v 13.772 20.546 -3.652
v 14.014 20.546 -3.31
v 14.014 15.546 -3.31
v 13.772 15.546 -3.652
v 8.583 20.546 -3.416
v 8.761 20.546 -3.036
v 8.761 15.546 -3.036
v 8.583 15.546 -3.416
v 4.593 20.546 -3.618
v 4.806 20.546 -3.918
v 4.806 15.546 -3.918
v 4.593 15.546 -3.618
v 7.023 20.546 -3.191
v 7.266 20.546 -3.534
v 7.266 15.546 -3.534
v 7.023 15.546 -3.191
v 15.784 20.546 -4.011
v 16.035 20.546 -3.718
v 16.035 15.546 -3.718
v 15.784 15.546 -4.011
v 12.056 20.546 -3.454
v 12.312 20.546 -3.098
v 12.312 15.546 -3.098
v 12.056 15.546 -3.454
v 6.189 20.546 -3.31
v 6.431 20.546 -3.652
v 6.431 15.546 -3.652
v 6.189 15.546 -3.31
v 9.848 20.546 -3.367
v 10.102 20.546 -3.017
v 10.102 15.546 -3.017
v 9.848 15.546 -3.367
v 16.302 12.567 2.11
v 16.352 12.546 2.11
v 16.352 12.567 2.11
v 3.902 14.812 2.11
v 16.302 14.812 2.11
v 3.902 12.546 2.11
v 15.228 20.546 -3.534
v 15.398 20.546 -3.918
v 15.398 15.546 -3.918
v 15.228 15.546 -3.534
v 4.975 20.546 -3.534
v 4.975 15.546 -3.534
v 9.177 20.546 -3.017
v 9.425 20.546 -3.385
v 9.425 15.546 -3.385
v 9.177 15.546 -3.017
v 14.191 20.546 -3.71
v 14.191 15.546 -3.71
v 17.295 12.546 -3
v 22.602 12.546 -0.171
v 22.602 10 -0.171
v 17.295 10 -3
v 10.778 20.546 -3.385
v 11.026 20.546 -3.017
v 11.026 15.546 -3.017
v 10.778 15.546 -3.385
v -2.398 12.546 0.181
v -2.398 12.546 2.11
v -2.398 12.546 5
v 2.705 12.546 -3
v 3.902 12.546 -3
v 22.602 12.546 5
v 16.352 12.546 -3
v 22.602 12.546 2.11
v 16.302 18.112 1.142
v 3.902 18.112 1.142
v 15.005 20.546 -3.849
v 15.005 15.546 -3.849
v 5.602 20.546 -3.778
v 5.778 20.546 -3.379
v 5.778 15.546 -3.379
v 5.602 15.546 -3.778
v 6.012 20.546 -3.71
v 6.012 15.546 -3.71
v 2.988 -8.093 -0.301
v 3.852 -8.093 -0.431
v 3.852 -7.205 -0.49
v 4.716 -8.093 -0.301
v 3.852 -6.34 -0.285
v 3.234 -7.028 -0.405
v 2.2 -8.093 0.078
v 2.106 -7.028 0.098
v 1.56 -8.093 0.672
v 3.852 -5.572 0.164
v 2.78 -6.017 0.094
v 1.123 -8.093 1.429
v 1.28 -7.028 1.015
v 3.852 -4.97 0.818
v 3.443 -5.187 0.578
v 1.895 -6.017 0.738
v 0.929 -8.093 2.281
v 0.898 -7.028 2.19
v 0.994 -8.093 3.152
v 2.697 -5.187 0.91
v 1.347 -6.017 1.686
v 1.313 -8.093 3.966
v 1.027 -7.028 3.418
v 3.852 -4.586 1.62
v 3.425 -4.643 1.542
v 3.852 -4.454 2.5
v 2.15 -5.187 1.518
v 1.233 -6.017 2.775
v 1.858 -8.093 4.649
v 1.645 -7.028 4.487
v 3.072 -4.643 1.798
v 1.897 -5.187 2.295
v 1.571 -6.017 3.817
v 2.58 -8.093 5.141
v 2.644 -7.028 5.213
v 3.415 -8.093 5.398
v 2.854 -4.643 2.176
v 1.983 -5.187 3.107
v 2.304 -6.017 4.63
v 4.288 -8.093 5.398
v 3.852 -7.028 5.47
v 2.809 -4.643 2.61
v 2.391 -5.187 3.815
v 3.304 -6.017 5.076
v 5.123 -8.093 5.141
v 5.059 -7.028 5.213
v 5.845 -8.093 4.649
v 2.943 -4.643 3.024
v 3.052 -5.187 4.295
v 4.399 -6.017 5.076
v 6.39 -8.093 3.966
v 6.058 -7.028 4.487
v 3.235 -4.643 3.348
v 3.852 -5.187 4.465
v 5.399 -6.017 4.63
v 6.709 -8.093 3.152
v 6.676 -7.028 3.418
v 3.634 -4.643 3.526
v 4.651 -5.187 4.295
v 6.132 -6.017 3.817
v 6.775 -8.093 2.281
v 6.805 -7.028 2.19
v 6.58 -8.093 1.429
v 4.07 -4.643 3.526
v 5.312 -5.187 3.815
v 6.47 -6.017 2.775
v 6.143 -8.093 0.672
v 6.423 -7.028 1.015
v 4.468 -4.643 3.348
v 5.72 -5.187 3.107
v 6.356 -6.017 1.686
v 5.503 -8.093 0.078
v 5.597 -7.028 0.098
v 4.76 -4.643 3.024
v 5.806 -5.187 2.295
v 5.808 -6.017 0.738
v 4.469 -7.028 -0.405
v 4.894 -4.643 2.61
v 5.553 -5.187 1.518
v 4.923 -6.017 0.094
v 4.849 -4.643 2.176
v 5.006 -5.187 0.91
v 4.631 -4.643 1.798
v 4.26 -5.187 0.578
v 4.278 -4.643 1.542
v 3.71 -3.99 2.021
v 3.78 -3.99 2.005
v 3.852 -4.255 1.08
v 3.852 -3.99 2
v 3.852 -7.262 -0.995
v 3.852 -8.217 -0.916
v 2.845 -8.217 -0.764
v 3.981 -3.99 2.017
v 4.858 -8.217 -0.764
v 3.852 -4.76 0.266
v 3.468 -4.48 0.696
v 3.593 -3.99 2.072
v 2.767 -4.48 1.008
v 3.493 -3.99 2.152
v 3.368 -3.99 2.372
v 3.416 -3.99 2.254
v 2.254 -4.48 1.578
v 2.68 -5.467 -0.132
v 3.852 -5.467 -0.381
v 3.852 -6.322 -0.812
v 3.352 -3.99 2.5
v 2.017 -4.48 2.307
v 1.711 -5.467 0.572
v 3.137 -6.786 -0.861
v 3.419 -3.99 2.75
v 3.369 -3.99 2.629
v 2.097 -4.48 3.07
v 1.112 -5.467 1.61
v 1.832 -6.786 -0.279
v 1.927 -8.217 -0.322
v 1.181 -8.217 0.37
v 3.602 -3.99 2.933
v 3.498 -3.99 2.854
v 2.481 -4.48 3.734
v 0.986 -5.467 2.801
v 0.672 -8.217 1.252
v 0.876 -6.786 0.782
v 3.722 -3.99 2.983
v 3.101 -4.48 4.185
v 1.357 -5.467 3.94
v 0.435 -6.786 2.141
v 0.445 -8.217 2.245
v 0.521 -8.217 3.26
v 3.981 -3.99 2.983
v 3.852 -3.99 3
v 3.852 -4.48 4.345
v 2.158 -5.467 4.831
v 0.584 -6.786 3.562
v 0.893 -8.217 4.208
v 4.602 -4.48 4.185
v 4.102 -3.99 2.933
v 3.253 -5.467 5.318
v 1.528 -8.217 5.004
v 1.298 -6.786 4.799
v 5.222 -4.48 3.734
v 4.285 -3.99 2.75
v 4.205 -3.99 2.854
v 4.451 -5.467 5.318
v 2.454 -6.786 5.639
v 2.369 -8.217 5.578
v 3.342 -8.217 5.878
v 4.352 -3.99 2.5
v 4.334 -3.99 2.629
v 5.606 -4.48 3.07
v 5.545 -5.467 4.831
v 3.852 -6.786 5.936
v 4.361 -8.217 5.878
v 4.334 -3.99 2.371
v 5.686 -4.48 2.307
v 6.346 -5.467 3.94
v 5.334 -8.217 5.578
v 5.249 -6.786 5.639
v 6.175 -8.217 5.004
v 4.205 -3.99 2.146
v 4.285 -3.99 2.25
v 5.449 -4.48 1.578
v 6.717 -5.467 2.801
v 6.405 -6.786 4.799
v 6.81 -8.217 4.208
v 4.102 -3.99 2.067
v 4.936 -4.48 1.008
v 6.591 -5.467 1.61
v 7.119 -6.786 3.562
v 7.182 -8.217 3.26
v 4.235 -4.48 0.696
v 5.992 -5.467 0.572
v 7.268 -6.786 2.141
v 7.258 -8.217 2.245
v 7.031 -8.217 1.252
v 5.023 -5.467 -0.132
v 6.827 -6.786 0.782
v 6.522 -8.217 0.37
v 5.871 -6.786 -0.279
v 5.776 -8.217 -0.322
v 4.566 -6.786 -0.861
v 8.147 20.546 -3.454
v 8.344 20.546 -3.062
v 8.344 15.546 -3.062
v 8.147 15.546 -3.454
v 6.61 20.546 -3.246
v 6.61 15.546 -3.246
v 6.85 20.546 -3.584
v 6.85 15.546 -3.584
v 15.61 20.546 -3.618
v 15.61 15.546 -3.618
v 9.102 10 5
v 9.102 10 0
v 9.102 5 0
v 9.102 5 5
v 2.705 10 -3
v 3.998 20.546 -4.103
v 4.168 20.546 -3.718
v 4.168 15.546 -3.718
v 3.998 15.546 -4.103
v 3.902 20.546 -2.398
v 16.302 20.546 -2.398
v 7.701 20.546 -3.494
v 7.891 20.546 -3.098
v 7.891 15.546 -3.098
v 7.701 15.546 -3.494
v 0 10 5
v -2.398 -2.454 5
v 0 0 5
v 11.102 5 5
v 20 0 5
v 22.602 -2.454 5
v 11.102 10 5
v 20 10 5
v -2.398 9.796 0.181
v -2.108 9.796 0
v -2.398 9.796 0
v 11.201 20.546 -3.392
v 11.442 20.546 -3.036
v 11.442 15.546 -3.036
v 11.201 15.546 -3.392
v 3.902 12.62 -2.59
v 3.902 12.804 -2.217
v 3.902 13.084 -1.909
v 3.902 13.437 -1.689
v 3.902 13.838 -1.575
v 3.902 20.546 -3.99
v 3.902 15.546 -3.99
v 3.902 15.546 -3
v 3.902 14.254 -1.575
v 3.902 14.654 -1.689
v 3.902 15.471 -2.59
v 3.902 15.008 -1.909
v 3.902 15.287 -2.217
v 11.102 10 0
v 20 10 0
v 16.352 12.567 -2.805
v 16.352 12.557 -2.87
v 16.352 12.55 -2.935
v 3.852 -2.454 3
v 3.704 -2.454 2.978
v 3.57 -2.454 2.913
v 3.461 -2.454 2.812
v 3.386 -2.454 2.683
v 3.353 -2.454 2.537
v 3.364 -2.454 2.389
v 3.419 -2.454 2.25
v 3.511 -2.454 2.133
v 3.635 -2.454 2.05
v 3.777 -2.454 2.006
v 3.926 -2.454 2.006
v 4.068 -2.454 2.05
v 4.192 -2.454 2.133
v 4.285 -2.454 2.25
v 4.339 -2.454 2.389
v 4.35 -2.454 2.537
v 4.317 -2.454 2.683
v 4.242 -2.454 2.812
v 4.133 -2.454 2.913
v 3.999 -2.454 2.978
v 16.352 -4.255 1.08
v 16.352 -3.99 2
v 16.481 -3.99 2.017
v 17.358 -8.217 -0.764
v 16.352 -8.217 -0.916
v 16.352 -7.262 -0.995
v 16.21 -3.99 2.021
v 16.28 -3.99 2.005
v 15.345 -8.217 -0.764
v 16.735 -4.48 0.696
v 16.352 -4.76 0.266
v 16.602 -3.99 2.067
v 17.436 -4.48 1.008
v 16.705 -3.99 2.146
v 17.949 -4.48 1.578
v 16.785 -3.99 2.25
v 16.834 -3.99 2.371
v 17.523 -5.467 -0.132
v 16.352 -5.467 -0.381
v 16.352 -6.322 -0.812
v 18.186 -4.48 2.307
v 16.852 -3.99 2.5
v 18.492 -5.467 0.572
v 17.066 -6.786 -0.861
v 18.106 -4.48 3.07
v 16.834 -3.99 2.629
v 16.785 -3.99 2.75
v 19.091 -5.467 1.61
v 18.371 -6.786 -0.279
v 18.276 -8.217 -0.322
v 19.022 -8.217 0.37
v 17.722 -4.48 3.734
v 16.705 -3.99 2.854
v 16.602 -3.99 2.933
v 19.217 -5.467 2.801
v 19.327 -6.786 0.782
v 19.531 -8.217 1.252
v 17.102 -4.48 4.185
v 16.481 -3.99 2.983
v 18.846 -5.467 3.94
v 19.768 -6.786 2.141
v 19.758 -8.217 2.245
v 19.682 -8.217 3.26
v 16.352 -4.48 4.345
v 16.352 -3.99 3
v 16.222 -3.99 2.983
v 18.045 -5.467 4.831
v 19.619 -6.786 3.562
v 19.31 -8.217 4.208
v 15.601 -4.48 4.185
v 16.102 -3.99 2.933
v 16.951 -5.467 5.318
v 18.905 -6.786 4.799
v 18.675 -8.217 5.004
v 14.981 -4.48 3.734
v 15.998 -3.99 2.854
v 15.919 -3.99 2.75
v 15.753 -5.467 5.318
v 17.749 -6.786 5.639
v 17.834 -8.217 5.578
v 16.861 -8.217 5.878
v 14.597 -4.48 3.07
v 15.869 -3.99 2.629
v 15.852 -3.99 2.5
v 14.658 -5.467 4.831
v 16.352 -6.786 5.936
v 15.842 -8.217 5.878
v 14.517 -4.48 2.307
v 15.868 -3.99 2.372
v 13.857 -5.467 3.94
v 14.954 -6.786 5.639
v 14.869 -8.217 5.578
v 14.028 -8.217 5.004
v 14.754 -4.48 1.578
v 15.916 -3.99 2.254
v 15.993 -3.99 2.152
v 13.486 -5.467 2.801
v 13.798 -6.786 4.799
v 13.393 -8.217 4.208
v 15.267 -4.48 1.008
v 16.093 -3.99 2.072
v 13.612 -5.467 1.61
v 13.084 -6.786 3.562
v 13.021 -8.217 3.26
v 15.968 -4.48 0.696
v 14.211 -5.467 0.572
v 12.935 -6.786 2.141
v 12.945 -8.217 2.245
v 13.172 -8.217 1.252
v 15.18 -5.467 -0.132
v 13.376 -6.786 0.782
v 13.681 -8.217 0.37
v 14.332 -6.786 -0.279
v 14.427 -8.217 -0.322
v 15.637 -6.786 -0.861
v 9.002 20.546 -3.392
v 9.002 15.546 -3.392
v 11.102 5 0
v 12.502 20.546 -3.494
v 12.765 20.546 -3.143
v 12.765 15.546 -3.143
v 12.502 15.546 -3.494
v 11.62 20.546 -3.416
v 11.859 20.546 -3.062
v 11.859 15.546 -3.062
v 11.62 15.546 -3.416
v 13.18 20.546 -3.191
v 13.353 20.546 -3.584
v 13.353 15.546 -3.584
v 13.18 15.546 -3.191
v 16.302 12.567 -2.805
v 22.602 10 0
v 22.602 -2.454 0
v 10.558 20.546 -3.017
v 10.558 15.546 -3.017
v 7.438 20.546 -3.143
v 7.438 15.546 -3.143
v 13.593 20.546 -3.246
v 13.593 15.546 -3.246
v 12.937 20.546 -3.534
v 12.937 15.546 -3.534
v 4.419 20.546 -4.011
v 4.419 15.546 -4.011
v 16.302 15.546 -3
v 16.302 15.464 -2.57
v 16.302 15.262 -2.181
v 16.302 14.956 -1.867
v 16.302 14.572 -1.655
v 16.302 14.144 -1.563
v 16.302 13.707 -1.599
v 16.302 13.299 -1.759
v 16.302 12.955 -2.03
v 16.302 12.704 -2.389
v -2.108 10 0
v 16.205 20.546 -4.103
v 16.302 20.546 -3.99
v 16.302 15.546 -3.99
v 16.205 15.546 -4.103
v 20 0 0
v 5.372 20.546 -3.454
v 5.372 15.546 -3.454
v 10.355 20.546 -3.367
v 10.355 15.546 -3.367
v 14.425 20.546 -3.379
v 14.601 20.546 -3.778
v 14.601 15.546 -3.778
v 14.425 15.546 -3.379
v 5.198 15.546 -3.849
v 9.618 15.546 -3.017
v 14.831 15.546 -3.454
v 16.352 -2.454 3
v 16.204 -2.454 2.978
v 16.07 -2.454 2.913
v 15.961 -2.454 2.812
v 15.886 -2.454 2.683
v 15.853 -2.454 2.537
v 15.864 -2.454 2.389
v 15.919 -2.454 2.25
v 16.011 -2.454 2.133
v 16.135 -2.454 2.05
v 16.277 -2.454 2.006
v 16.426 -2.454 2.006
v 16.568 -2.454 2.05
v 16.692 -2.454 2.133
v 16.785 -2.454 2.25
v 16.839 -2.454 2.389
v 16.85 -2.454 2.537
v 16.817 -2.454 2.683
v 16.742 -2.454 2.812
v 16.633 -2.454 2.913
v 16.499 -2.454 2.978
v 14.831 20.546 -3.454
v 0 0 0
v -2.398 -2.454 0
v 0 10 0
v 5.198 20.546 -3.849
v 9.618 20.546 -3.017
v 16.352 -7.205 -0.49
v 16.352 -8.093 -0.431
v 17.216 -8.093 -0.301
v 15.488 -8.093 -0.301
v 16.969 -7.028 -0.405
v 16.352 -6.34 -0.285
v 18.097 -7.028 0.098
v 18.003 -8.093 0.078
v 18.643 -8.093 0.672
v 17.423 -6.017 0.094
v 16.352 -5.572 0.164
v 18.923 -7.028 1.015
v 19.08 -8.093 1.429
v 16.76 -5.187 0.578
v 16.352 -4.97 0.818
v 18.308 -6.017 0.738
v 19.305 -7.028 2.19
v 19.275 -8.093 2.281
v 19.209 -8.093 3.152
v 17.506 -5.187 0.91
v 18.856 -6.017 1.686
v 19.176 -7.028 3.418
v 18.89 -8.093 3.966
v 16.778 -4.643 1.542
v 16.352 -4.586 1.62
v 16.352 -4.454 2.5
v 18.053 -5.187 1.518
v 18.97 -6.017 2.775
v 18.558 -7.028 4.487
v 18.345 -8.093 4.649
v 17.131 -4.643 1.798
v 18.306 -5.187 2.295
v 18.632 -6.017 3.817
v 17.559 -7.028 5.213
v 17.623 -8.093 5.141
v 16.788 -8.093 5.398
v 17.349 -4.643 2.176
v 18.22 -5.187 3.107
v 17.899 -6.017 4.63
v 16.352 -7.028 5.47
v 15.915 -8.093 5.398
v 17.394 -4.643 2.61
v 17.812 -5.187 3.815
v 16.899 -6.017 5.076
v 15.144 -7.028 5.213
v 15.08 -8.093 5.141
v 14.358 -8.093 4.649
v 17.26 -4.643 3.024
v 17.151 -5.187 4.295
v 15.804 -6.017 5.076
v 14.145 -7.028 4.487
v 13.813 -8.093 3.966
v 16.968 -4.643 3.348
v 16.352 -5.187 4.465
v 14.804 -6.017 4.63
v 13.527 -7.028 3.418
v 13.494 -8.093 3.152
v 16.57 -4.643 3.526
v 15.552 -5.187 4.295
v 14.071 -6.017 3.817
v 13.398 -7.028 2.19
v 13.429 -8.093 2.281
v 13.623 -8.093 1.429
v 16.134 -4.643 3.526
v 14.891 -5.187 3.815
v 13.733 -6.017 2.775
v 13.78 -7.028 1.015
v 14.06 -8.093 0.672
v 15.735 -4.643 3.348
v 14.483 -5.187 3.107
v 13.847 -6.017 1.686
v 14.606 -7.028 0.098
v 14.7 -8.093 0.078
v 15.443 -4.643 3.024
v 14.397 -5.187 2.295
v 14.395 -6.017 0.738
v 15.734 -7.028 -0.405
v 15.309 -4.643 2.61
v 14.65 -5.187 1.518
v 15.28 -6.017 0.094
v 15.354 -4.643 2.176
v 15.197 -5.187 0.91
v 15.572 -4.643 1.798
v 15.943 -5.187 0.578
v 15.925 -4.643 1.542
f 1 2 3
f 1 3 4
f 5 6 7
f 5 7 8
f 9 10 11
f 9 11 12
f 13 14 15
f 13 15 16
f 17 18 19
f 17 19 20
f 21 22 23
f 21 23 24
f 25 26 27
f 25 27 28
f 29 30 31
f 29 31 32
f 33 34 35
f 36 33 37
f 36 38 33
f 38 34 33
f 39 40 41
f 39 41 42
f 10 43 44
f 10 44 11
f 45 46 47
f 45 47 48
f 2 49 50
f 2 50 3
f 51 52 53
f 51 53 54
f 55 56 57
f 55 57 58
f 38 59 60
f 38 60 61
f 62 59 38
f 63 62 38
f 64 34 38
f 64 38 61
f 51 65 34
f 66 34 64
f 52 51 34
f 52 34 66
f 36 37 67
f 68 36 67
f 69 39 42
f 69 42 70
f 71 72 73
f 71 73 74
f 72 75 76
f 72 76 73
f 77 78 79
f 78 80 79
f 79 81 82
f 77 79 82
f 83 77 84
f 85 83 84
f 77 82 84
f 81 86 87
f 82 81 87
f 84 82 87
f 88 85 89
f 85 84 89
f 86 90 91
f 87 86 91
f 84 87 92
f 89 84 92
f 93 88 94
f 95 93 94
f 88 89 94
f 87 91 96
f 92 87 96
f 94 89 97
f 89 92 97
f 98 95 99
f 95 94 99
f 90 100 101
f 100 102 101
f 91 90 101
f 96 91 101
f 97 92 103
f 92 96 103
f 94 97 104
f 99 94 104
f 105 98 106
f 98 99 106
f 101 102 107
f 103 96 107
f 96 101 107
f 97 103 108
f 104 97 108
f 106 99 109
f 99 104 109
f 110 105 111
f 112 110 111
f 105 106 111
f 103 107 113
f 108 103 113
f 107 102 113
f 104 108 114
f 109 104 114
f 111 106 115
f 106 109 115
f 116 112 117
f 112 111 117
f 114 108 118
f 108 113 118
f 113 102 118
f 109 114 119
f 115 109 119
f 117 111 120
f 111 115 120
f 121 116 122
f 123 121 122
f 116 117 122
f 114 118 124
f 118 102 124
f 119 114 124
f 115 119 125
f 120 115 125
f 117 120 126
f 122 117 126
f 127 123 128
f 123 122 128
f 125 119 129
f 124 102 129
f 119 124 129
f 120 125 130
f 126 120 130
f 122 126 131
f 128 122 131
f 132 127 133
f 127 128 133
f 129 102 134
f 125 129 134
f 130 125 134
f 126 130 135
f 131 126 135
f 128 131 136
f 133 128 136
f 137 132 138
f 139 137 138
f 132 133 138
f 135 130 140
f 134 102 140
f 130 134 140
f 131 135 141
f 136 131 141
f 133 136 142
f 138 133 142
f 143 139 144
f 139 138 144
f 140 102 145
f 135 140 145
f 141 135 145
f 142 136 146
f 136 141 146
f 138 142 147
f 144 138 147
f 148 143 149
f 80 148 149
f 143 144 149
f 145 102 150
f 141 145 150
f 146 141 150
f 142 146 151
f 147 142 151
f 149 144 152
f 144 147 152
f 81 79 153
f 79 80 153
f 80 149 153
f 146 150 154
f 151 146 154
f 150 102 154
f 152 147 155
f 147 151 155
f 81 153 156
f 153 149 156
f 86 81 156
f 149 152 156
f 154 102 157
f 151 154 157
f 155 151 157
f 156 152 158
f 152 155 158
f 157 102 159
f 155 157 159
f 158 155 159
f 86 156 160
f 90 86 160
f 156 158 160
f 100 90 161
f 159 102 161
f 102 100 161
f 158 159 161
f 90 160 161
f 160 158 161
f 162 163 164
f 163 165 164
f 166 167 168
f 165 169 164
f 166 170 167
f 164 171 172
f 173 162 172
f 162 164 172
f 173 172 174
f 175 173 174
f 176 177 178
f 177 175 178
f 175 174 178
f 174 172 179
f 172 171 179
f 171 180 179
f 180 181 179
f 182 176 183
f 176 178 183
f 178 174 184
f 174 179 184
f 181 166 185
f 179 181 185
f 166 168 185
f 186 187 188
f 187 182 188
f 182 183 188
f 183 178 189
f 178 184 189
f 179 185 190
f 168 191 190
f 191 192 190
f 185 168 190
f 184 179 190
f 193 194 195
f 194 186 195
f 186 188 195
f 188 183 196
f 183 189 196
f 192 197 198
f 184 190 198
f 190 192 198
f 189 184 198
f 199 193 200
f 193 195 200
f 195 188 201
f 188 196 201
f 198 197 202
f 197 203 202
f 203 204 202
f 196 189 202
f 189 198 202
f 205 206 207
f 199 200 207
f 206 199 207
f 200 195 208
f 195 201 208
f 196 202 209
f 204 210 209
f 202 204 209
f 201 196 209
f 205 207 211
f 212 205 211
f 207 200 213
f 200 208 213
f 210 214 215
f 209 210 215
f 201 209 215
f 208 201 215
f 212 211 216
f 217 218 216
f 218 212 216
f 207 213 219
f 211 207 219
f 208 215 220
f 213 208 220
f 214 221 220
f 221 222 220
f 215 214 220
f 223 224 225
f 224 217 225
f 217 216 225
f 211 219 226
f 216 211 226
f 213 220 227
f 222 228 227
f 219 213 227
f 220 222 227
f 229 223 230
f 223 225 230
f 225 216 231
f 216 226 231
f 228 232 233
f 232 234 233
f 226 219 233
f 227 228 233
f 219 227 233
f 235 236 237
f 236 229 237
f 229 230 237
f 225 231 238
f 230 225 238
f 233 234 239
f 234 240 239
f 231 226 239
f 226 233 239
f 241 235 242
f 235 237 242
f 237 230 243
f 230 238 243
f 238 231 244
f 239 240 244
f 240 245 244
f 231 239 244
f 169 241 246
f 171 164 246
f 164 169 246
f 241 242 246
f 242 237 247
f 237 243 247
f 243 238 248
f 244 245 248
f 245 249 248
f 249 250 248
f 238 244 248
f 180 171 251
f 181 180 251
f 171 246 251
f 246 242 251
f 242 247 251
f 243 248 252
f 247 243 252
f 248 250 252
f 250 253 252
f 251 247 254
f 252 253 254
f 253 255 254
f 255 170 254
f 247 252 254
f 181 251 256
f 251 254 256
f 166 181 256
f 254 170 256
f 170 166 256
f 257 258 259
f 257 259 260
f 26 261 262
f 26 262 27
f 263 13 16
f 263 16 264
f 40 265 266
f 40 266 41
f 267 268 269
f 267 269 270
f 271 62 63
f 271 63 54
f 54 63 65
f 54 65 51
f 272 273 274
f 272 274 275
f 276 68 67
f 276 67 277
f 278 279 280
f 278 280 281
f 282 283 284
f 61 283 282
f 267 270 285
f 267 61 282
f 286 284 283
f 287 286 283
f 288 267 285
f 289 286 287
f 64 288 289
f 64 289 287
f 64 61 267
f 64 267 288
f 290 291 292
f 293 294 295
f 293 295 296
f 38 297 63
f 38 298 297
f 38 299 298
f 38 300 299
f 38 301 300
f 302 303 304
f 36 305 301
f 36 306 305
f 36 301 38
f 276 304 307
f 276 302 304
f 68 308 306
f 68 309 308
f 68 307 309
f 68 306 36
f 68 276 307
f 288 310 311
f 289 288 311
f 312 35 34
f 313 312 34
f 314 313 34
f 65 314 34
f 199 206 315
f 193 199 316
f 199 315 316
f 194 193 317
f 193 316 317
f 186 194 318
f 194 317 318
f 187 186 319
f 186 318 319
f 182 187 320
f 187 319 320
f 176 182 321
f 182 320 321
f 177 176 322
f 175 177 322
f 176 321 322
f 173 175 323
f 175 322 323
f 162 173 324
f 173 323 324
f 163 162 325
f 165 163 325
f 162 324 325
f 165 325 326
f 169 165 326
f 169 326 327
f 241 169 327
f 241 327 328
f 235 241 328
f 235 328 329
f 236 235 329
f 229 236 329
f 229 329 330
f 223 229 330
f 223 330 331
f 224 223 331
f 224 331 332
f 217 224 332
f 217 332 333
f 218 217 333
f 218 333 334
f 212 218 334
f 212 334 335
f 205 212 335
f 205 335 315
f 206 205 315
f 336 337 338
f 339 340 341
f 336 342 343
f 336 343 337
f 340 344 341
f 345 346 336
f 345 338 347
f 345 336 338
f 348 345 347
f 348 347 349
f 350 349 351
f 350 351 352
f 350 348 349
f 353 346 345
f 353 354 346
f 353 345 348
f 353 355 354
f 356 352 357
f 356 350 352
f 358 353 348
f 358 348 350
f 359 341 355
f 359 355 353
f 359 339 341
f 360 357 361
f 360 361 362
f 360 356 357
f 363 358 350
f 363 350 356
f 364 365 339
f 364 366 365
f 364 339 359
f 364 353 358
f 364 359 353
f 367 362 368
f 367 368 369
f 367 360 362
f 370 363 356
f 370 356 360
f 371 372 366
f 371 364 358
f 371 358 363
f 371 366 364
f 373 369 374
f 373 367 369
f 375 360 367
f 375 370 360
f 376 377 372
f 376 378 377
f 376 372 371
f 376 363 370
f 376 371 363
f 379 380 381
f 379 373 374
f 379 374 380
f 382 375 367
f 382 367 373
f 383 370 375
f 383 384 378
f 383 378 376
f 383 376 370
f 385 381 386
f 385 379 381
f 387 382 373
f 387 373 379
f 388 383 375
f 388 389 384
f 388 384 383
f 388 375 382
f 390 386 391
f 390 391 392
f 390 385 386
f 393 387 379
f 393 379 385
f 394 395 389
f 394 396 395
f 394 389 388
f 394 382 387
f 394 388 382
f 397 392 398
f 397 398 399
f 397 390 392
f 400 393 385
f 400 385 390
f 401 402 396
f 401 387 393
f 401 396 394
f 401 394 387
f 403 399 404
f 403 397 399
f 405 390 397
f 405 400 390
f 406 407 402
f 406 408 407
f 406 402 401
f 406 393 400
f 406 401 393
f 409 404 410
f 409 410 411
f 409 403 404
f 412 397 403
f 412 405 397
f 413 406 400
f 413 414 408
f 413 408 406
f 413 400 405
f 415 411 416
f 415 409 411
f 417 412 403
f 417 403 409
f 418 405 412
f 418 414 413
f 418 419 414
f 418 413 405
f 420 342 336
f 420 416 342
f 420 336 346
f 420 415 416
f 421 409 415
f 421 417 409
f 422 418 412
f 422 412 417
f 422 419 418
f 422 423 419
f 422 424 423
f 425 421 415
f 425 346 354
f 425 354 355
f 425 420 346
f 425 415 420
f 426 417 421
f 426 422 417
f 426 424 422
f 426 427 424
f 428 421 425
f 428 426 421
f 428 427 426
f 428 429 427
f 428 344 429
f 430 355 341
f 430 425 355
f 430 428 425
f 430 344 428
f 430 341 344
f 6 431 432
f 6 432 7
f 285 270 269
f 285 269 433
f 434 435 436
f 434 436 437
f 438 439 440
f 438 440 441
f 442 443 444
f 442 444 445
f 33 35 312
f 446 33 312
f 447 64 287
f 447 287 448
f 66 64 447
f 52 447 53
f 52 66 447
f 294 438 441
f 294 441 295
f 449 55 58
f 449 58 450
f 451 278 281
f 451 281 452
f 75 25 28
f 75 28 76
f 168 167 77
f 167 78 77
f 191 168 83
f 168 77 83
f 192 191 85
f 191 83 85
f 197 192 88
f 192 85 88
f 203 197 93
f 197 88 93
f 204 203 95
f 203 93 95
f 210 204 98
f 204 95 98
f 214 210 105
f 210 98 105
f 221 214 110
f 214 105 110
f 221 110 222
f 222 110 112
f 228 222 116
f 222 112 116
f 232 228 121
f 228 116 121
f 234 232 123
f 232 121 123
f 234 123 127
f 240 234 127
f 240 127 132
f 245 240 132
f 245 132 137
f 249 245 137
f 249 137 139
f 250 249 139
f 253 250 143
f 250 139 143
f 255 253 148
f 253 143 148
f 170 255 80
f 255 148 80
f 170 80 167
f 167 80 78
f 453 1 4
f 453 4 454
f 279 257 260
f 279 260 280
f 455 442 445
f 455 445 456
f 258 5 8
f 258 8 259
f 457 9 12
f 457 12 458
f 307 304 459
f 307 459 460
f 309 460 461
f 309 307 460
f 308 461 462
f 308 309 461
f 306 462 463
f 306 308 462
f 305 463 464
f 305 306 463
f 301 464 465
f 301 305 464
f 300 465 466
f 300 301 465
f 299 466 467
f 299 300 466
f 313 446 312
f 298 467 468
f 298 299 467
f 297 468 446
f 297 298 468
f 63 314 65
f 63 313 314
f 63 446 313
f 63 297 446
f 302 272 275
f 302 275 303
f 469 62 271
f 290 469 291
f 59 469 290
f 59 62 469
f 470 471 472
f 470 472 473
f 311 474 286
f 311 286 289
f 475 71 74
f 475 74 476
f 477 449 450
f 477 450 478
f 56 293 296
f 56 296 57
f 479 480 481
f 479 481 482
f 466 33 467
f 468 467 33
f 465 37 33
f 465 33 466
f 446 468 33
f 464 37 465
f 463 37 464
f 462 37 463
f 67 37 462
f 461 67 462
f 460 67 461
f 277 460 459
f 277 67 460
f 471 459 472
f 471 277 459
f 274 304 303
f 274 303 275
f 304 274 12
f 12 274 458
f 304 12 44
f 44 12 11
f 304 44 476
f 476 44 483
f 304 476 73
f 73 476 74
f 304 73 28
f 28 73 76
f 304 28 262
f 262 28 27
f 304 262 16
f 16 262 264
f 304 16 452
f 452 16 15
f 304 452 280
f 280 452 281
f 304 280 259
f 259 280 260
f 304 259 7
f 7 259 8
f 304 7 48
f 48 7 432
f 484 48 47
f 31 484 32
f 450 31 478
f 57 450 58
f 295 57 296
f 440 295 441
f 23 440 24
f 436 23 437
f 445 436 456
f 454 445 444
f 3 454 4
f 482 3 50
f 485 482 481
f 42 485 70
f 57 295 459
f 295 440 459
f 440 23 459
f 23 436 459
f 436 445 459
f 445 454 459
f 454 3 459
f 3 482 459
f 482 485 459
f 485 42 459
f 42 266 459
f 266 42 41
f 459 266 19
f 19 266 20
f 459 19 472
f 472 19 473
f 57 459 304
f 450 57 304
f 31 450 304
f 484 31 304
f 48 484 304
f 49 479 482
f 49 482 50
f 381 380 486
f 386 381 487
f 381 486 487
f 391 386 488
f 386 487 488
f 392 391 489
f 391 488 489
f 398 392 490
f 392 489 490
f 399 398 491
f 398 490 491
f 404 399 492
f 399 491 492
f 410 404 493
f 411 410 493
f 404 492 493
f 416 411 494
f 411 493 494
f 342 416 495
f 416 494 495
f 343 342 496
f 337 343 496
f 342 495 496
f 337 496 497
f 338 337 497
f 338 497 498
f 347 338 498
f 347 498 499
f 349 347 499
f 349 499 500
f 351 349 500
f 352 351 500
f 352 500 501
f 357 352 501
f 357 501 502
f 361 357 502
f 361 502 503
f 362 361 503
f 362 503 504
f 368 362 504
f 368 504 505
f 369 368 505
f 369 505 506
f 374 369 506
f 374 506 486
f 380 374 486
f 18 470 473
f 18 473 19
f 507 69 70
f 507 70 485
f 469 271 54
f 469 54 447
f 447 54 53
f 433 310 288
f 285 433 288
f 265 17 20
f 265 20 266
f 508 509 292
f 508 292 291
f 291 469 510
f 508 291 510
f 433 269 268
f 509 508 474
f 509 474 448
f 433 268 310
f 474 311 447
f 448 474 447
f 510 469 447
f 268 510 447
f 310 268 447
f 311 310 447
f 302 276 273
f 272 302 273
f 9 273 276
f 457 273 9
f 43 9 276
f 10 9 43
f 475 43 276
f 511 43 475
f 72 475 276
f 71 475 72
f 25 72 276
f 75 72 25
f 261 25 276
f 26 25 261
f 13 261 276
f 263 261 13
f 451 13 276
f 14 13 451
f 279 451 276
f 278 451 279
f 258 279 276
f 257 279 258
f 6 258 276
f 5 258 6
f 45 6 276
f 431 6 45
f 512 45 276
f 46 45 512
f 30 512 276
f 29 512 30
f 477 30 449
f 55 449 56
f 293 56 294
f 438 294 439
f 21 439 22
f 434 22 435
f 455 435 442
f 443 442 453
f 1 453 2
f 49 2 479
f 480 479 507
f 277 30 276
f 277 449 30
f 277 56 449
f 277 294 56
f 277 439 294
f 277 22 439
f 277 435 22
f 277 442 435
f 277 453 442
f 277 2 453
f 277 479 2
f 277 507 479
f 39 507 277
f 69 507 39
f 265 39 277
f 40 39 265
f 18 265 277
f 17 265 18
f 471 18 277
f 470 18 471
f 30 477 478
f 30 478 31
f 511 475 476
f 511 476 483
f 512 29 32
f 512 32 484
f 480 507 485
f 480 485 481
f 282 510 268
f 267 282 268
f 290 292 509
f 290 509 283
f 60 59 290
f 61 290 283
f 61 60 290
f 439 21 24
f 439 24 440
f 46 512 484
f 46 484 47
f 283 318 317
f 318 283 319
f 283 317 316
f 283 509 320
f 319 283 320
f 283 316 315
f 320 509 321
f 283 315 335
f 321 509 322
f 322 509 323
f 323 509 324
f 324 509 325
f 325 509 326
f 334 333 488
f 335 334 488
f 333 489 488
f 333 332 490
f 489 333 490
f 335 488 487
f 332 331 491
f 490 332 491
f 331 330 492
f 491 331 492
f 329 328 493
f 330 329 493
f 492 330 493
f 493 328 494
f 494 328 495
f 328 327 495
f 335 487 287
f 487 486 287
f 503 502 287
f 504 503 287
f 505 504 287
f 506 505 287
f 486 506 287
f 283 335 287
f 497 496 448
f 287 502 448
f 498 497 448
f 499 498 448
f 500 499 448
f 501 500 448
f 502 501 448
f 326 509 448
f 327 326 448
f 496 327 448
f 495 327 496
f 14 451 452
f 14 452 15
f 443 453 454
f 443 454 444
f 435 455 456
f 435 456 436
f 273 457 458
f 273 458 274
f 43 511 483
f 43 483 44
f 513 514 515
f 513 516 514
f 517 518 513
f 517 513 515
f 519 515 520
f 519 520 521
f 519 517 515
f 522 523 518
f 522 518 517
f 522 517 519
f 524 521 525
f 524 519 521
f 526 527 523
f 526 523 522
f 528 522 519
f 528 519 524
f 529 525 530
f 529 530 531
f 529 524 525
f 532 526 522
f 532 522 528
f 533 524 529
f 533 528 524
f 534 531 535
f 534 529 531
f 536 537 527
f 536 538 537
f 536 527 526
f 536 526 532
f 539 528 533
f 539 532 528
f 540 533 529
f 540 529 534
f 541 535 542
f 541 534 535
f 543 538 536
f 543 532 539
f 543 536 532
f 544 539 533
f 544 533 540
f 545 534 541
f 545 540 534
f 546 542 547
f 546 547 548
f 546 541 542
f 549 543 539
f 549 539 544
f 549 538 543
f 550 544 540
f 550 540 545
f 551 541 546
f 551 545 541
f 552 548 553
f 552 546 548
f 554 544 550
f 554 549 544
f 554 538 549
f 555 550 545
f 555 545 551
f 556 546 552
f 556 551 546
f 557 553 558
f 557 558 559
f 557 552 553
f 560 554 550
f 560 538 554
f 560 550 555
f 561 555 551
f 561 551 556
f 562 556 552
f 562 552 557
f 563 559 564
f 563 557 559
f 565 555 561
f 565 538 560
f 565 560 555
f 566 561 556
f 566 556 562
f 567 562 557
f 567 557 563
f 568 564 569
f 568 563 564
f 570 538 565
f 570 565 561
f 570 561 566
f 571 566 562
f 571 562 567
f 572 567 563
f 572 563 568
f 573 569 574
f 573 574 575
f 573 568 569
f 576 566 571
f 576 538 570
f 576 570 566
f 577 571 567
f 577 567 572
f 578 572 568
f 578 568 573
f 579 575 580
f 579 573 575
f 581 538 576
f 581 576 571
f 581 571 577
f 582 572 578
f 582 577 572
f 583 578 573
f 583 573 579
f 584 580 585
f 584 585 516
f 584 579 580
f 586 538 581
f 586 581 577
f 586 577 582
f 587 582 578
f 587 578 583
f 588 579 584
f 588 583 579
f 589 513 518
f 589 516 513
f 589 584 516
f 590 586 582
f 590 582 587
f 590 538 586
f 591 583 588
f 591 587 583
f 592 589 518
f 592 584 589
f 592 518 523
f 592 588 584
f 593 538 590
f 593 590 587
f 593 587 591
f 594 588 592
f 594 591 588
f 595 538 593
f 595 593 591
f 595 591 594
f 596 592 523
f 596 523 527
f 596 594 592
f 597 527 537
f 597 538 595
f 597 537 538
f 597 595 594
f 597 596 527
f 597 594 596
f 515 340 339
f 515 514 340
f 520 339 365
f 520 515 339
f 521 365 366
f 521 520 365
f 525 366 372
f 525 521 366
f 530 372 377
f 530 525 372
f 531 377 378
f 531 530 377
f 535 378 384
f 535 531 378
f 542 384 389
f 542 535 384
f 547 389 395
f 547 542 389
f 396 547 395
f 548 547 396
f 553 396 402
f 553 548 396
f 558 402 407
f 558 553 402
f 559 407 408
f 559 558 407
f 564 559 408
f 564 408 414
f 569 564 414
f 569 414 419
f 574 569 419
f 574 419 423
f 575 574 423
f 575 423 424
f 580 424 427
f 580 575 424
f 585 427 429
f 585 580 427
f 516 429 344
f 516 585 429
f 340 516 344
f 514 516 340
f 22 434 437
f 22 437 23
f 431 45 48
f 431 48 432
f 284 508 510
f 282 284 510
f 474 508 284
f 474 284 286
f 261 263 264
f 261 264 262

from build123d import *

# Parameters (mm, degrees)
SKETCH1_W            = 25
SKETCH1_H            = 15
SKETCH1_W_2          = 20
SKETCH1_H_2          = 10
BOSS_EXTRUDE1_DEPTH  = 5
SKETCH2_R            = 0.5
BOSS_EXTRUDE2_DEPTH  = 2
SKETCH5_W            = 2
SKETCH5_H            = 5
BOSS_EXTRUDE3_DEPTH  = 5
SKETCH9_W            = 25
SKETCH9_H            = 3
BOSS_EXTRUDE6_DEPTH  = 2.5458
BOSS_EXTRUDE11_DEPTH = 25
BOSS_EXTRUDE12_DEPTH = 5
SKETCH13_W           = 15.672382287
SKETCH13_H           = 8.611187453
CUT_EXTRUDE2_DEPTH   = 6.3
SKETCH14_W           = 15.973777952
SKETCH14_H           = 8.468711573
CUT_EXTRUDE4_DEPTH   = 6.3
SKETCH17_W           = 5.109908143
SKETCH17_H           = 0.020831831
CUT_EXTRUDE6_DEPTH   = 6.25
CUT_EXTRUDE9_DEPTH   = 2.75


with BuildPart() as part:
    # Sketch1 → Boss-Extrude1 (new body)
    with BuildSketch(Plane.XY):
        with Locations((10.101524963, 5.045869423)):
            Rectangle(SKETCH1_W, SKETCH1_H)
        with Locations((10, 5)):
            Rectangle(SKETCH1_W_2, SKETCH1_H_2, mode=Mode.SUBTRACT)
    extrude(amount=BOSS_EXTRUDE1_DEPTH)

    # Sketch2 → Boss-Extrude2 (add)
    with BuildSketch(Plane.XZ.offset(2.454130577)):
        with Locations(Location((16.351524963, 2.5, 0), (0, 0, 90))):
            Circle(SKETCH2_R)
        with Locations(Location((3.851524963, 2.5, 0), (0, 0, 90))):
            Circle(SKETCH2_R)
    extrude(amount=BOSS_EXTRUDE2_DEPTH)

    # Sketch4 → Revolve1 (revolve)
    with BuildSketch(Plane.ZY.offset(-3.851524963)):
        with BuildLine():
            Line((2.5, -4.454130577), (2.5, -3.954130577))
            ThreePointArc((2.5, -3.954130577), (-0.231202032, -5.265401389), (-0.915920918, -8.216681744))
            Line((-0.915920918, -8.216681744), (-0.431201702, -8.092923646))
            ThreePointArc((-0.431201702, -8.092923646), (0.163723132, -5.572160759), (2.5, -4.454130577))
        make_face()
    revolve1 = revolve(axis=Axis((3.851524963, -4.454130577, 2.5), (0, 1, 0)))

    # Mirror1: Revolve1 across plane
    add(revolve1.mirror(Plane.ZY.offset(-10.101524963)))

    # Sketch5 → Boss-Extrude3 (add)
    with BuildSketch(Plane.XZ.offset(-10)):
        with Locations((10.101524963, 2.5)):
            Rectangle(SKETCH5_W, SKETCH5_H)
    extrude(amount=BOSS_EXTRUDE3_DEPTH)

    # Sketch9 → Boss-Extrude6 (add)
    with BuildSketch(Plane(origin=(0, 12.545869423, 0), x_dir=(1, 0, 0), z_dir=(0, 1, 0))):
        with Locations((10.101524963, 1.5)):
            Rectangle(SKETCH9_W, SKETCH9_H)
    extrude(amount=-BOSS_EXTRUDE6_DEPTH)

    # Sketch10 → Boss-Extrude11 (add)
    with BuildSketch(Plane.ZY.offset(2.398475037)):
        with BuildLine():
            Line((-3, 20.545869423), (-3, 15.545869423))
            ThreePointArc((-3, 15.545869423), (-1.560121709, 14.045869423), (-3, 12.545869423))
            Line((-3, 12.545869423), (2.109908143, 12.545869423))
            Line((2.109908143, 12.545869423), (2.109908143, 14.812382809))
            Line((2.109908143, 14.812382809), (1.14185951, 18.112167841))
            Line((1.14185951, 18.112167841), (-2.398491653, 20.545869423))
            Line((-2.398491653, 20.545869423), (-3, 20.545869423))
        make_face()
    extrude(amount=-BOSS_EXTRUDE11_DEPTH)

    # Sketch11 → Boss-Extrude12 (add)
    with BuildSketch(Plane(origin=(0, 20.545869423, 0), x_dir=(1, 0, 0), z_dir=(0, 1, 0))):
        Polygon((22.601524963, 6.370034263), (22.218498761, 6.583454581), (22.206504106, 6.145147118), (21.839800975, 6.36430085), (21.839800975, 5.944815365), (21.470908859, 6.165277305), (21.470908859, 5.751252067), (21.090285371, 5.978725057), (21.090285371, 5.559686479), (20.715009404, 5.783963617), (20.715009404, 5.37871548), (20.340220839, 5.60270133), (20.340220839, 5.205623066), (19.969772082, 5.427015305), (19.969772082, 5.041871154), (19.609473543, 5.257197293), (19.609473543, 4.889453606), (19.240036756, 5.110241059), (19.204018954, 4.725841041), (18.84343083, 4.941340245), (18.809044063, 4.574347447), (18.482899309, 4.833590643), (18.434301365, 4.437674053), (18.099284993, 4.703969045), (18.029565103, 4.297643206), (17.685889029, 4.570821549), (17.636576293, 4.169081713), (17.36430182, 4.468570031), (17.241504215, 4.047072227), (16.949921416, 4.338518658), (16.830217977, 3.927641452), (16.56189014, 4.222788666), (16.445356586, 3.82279196), (16.205334691, 4.102534079), (16.03541914, 3.718356506), (15.784012514, 4.011367368), (15.609927315, 3.617762258), (15.397544049, 3.917976793), (15.227764955, 3.53410775), (15.005332386, 3.848527484), (14.830770329, 3.453844203), (14.601445444, 3.778006576), (14.424838392, 3.378699578), (14.190795155, 3.709531583), (14.01395843, 3.309705298), (13.77195079, 3.65179539), (13.592594218, 3.246271753), (13.353481935, 3.584269111), (13.179653394, 3.191244304), (12.937387652, 3.533699238), (12.7645906, 3.143006617), (12.501662523, 3.493899949), (12.3122286, 3.098460835), (12.055758175, 3.454101418), (11.859127953, 3.062190893), (11.619872014, 3.416106336), (11.44208312, 3.03616005), (11.201398975, 3.392188142), (11.025924275, 3.017187439), (10.777585982, 3.384537806), (10.557631993, 3.017187439), (10.355137202, 3.367185629), (10.101524963, 3.017187439), (9.847912725, 3.367185629), (9.61814049, 3.017187439), (9.425463944, 3.384537806), (9.177125651, 3.017187439), (9.001650951, 3.392188142), (8.760966807, 3.03616005), (8.583177912, 3.416106336), (8.343921973, 3.062190893), (8.147291751, 3.454101418), (7.890821326, 3.098460835), (7.701387404, 3.493899949), (7.438459327, 3.143006617), (7.265662275, 3.533699238), (7.023396532, 3.191244304), (6.849567992, 3.584269111), (6.610455709, 3.246271753), (6.431099137, 3.65179539), (6.189091497, 3.309705298), (6.012254772, 3.709531583), (5.778211534, 3.378699578), (5.601604482, 3.778006576), (5.372279597, 3.453844203), (5.19771754, 3.848527484), (4.975284972, 3.53410775), (4.805505878, 3.917976793), (4.593122611, 3.617762258), (4.419037412, 4.011367368), (4.167630787, 3.718356506), (3.997715235, 4.102534079), (3.757693341, 3.82279196), (3.641159786, 4.222788666), (3.37283195, 3.927641452), (3.253128511, 4.338518658), (2.961545711, 4.047072227), (2.838748106, 4.468570031), (2.566473633, 4.169081713), (2.517160897, 4.570821549), (2.173484824, 4.297643206), (2.103764933, 4.703969045), (1.768748562, 4.437674053), (1.720150617, 4.833590643), (1.394005864, 4.574347447), (1.359619096, 4.941340245), (0.999030973, 4.725841041), (0.96301317, 5.110241059), (0.593576383, 4.889453606), (0.593576383, 5.257197293), (0.233277844, 5.041871154), (0.233277844, 5.427015305), (-0.137170912, 5.205623066), (-0.137170912, 5.60270133), (-0.511959477, 5.37871548), (-0.511959477, 5.783963617), (-0.887235445, 5.559686479), (-0.887235445, 5.978725057), (-1.267858932, 5.751252067), (-1.267858932, 6.165277305), (-1.636751048, 5.944815365), (-1.636751048, 6.36430085), (-2.00345418, 6.145147118), (-2.015448835, 6.583454581), (-2.398475037, 6.370034263), (-2.398475037, 3), (22.601524963, 3), align=None)
    extrude(amount=-BOSS_EXTRUDE12_DEPTH)

    # Sketch13 → Cut-Extrude2 (cut)
    with BuildSketch(Plane.ZY.offset(2.398475037)):
        with Locations((0.217053265, 16.85146315)):
            Rectangle(SKETCH13_W, SKETCH13_H)
    extrude(amount=-CUT_EXTRUDE2_DEPTH, mode=Mode.SUBTRACT)

    # Sketch14 → Cut-Extrude4 (cut)
    with BuildSketch(Plane(origin=(22.601524963, 0, 0), x_dir=(0, 0, -1), z_dir=(1, 0, 0))):
        with Locations((-0.130094813, 16.801057041)):
            Rectangle(SKETCH14_W, SKETCH14_H)
    extrude(amount=-CUT_EXTRUDE4_DEPTH, mode=Mode.SUBTRACT)

    # Sketch17 → Cut-Extrude6 (cut)
    with BuildSketch(Plane(origin=(22.601524963, 0, 0), x_dir=(0, 0, -1), z_dir=(1, 0, 0))):
        with Locations((0.445045928, 12.556285339)):
            Rectangle(SKETCH17_W, SKETCH17_H)
    extrude(amount=-CUT_EXTRUDE6_DEPTH, mode=Mode.SUBTRACT)

    # Sketch21 → Cut-Extrude9 (cut)
    with BuildSketch(Plane(origin=(0, 12.545869423, 0), x_dir=(1, 0, 0), z_dir=(0, 1, 0))):
        Polygon((-2.398475037, -0.181001123), (-2.398475037, 3), (2.705080675, 3), align=None)
        Polygon((17.294919325, 3), (22.601524963, 3), (22.601524963, 0.170691666), align=None)
    extrude(amount=-CUT_EXTRUDE9_DEPTH, mode=Mode.SUBTRACT)


solid = part.part
